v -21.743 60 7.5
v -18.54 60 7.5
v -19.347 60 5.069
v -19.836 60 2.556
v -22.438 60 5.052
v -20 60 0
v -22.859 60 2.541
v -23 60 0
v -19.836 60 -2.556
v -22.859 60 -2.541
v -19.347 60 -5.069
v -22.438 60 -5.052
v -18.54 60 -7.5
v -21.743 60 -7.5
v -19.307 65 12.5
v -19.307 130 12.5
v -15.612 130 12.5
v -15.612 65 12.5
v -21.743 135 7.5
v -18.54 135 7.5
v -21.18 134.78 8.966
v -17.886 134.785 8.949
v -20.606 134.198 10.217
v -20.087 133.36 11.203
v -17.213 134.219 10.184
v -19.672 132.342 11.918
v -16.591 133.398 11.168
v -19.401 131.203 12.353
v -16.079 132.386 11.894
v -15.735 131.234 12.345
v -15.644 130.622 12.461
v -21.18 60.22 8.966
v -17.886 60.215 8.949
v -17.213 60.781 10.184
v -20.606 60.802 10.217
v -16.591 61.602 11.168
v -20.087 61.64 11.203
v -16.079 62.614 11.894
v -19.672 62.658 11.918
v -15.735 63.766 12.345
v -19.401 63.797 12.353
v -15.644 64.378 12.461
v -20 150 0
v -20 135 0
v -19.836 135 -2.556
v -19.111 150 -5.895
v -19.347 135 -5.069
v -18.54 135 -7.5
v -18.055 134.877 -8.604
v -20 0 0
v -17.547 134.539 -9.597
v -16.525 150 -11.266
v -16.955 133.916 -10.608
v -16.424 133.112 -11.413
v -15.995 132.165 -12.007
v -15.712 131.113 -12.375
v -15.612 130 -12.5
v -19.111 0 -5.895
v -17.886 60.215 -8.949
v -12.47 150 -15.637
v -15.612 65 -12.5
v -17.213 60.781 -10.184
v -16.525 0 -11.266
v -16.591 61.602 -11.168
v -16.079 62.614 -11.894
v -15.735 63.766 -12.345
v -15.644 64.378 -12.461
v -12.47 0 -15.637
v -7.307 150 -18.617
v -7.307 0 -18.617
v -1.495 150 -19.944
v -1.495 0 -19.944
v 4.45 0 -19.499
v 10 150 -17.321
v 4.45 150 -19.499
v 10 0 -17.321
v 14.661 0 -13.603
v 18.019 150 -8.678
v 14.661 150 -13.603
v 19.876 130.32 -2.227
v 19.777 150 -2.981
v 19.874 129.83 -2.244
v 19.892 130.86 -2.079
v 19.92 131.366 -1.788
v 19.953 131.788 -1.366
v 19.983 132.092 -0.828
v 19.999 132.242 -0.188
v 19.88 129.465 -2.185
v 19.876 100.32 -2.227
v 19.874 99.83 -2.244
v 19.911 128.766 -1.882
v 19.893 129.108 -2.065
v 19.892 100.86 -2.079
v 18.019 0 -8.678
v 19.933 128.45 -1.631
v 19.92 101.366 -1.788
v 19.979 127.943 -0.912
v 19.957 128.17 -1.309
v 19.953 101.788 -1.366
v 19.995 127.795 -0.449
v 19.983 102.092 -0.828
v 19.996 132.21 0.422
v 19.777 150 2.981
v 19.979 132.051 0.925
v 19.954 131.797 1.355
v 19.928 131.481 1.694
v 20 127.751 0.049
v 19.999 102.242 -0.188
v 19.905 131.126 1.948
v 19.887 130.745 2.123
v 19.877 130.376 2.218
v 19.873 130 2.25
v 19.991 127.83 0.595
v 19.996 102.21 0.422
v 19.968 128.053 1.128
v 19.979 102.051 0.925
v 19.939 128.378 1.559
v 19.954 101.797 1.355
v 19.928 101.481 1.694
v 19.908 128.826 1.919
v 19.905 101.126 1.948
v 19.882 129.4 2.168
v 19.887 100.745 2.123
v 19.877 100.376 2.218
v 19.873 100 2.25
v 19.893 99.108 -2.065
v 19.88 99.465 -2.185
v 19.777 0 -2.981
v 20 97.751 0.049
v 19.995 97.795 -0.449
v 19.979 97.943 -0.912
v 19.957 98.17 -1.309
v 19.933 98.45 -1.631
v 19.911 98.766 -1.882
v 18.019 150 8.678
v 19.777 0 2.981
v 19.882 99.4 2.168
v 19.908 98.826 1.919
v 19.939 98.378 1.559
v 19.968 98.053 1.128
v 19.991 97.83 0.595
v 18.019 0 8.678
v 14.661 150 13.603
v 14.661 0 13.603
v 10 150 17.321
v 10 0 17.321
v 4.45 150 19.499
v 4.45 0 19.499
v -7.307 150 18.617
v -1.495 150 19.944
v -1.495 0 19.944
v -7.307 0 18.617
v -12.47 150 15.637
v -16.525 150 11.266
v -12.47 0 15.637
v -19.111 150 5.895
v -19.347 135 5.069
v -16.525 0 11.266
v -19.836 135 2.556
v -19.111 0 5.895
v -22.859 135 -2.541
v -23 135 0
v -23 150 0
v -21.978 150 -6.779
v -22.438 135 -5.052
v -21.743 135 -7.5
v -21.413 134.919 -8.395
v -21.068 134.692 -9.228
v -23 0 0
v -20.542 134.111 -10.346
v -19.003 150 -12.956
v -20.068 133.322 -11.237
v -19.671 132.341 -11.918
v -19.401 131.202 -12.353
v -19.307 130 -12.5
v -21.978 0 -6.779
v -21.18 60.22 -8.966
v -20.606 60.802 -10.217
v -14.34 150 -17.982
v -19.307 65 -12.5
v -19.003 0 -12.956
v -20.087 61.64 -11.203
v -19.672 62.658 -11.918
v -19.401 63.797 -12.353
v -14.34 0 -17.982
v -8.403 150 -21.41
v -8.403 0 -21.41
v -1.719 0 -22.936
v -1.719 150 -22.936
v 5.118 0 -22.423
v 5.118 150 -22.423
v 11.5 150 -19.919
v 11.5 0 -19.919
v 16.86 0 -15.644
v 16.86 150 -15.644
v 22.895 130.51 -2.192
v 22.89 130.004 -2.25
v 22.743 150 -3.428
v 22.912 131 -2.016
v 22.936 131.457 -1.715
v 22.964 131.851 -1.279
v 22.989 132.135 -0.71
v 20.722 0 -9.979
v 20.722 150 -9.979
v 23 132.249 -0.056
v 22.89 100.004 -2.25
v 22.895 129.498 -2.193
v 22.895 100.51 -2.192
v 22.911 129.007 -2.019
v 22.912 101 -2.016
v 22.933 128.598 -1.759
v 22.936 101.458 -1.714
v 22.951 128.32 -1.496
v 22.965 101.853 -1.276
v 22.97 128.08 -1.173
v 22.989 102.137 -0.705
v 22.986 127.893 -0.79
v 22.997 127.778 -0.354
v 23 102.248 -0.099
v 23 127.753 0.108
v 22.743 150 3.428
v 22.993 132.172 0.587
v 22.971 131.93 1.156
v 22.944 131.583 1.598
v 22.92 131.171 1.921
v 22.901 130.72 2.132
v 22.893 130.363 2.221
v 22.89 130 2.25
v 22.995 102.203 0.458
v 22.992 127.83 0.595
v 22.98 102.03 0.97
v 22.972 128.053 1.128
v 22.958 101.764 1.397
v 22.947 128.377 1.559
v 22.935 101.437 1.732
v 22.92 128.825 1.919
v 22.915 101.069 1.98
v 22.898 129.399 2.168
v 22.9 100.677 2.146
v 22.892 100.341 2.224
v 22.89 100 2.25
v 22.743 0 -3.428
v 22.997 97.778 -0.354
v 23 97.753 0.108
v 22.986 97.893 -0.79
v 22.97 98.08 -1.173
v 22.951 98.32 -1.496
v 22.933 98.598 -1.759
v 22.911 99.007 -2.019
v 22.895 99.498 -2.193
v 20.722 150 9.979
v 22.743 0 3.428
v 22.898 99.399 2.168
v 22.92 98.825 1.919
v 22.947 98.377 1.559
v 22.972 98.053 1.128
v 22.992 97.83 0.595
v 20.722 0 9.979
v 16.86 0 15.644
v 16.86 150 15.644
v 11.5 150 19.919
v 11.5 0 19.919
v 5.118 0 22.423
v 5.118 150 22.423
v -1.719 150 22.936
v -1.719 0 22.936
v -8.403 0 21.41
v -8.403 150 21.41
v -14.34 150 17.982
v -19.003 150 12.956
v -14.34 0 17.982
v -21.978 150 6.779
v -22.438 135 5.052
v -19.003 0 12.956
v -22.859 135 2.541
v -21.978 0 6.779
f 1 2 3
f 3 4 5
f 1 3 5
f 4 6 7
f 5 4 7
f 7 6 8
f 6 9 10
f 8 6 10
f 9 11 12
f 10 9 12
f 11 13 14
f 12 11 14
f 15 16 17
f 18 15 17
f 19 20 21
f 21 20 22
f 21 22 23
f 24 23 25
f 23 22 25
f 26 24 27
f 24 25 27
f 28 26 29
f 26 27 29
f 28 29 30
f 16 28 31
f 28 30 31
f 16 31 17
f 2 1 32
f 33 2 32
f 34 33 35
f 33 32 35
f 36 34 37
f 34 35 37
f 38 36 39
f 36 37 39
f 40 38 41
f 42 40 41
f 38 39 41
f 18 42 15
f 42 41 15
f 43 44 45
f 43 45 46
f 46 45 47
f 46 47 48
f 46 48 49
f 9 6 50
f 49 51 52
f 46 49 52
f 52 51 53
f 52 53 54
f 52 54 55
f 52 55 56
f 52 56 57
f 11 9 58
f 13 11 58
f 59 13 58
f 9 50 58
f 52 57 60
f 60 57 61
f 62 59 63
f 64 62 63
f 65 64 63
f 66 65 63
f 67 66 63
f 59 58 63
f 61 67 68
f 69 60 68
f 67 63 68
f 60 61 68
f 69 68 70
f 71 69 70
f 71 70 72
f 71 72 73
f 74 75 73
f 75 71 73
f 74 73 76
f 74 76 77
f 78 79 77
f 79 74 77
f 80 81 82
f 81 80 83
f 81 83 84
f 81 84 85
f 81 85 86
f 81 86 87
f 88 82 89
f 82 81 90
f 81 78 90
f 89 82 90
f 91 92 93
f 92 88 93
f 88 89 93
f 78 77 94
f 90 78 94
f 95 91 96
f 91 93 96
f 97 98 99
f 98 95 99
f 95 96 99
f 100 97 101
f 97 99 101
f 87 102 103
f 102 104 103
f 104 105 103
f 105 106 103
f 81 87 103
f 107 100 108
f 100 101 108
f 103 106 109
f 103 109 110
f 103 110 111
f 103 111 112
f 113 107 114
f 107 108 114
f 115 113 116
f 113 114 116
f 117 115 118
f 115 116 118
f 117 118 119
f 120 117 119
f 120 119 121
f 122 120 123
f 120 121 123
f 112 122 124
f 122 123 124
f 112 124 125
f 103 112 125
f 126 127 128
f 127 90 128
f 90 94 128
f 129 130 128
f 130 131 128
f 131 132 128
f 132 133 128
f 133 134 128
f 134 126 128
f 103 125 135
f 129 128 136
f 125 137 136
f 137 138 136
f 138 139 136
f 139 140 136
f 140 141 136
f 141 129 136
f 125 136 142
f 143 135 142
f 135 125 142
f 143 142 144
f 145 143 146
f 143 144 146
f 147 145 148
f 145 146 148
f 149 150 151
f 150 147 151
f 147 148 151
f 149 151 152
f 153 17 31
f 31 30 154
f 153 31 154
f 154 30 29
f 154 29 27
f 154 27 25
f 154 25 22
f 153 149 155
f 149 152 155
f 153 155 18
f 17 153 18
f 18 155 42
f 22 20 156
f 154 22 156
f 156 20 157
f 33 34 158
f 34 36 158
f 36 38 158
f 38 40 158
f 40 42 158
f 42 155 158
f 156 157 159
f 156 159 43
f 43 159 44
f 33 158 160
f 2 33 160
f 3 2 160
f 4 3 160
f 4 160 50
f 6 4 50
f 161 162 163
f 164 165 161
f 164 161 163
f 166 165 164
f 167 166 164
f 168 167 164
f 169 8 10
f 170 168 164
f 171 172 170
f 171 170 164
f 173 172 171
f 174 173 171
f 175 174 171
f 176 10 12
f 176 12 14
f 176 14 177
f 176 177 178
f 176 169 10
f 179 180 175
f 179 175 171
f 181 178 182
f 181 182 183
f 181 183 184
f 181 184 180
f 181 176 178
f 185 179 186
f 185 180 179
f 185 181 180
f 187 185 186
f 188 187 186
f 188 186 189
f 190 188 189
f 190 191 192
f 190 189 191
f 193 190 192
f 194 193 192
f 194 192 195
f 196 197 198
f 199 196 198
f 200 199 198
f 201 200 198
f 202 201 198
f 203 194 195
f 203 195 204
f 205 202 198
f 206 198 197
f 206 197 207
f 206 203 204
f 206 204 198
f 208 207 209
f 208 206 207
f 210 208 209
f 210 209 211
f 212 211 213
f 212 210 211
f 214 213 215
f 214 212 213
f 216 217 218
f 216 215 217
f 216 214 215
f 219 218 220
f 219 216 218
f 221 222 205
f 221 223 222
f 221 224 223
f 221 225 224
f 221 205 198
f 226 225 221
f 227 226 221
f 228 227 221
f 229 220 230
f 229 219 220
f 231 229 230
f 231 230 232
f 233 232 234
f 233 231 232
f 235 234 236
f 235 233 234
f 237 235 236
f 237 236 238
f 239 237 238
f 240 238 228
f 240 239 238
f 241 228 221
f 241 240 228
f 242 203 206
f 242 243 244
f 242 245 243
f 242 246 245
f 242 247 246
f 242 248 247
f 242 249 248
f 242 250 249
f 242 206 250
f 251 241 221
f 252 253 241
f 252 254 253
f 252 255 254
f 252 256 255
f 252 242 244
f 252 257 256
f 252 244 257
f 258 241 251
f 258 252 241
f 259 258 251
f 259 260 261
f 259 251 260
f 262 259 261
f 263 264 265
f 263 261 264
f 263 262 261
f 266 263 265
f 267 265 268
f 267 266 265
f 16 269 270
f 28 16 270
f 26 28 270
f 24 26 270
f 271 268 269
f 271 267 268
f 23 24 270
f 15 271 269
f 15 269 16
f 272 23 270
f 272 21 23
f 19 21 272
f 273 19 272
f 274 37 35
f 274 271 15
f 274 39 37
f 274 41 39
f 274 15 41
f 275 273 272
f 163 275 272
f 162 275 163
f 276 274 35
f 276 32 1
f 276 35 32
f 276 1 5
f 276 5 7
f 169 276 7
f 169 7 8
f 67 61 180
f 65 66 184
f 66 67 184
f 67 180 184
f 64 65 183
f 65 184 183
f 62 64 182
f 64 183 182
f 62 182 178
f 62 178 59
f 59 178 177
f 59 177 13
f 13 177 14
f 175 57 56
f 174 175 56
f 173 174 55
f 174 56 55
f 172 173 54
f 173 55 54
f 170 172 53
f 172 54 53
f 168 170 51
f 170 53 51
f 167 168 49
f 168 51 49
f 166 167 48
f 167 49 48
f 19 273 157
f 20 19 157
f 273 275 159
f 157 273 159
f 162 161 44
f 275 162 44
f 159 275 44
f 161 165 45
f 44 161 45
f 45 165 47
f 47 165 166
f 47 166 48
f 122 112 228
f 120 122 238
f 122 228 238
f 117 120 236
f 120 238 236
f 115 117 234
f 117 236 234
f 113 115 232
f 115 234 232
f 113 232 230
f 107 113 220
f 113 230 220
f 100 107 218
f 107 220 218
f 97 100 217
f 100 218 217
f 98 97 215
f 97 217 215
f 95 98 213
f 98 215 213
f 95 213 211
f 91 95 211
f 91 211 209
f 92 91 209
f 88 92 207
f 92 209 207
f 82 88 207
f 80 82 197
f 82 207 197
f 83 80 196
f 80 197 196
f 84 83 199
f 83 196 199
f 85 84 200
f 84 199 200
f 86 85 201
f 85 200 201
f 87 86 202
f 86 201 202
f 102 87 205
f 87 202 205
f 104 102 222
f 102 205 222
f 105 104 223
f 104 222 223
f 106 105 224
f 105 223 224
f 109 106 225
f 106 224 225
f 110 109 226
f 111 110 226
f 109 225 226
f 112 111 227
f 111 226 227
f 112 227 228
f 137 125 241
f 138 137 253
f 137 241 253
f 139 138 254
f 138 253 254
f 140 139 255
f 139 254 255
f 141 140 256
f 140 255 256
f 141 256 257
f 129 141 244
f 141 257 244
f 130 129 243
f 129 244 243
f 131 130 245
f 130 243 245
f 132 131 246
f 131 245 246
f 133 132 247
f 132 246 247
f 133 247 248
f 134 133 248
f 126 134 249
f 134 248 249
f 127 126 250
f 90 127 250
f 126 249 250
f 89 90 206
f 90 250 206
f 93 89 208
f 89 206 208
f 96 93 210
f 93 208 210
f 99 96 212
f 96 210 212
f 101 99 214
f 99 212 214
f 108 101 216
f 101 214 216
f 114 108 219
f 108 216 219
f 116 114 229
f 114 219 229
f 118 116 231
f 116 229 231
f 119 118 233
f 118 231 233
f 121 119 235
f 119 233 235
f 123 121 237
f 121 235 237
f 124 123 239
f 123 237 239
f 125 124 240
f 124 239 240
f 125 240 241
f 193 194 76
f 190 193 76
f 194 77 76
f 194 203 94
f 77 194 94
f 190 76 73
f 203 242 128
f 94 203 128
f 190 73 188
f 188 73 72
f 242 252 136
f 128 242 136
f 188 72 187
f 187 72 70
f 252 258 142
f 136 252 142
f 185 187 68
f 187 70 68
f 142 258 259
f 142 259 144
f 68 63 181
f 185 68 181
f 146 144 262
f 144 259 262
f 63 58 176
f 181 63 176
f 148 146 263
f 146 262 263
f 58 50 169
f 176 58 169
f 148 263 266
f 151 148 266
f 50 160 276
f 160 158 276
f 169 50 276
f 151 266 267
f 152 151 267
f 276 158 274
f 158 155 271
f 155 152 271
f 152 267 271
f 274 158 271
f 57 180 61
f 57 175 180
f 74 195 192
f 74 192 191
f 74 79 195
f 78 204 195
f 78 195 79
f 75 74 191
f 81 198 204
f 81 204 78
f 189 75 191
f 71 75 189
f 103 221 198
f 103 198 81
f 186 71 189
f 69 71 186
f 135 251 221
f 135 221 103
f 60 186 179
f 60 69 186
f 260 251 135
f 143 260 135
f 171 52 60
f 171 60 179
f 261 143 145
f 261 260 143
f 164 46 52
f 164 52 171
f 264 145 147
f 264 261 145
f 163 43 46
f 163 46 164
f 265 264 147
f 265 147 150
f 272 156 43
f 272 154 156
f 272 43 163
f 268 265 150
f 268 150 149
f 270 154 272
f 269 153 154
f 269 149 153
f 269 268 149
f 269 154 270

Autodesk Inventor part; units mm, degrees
ref_plane "YZ Plane" through (0, 0, 0) normal (1, 0, 0) x (0, 1, 0)
ref_plane "XZ Plane" through (0, 0, 0) normal (0, 1, 0) x (-1, 0, 0)
ref_plane "XY Plane" through (0, 0, 0) normal (0, 0, 1) x (1, 0, 0)
sketch "Sketch1" plane through (0, 0, 0) normal (0, 1, 0) x (-1, 0, 0)
  circle A0 centre (0, 0) radius 23
  circle A1 centre (0, 0) radius 20
  dimension "d0" = 3
  dimension "d1" = 40
extrude "Extrusion1" add sketch "Sketch1" along normal blind 150
sketch "Sketch2" plane through (0, 0, 0) normal (0, 0, 1) x (1, 0, 0)
  line L0 (-23, 135) -> (0, 135)
  line L1 (0, 135) -> (0, 60)
  line L2 (0, 60) -> (-23, 60)
  line L3 (-23, 60) -> (-23, 135)
  line L4 (23, 150) -> (-23, 150) projected
  line L5 (-23, 0) -> (23, 0) projected
  point P0 (0, 0)
  dimension "d4" = 75
  dimension "d19" = 15
extrude "Extrusion2" cut sketch "Sketch2" along normal mid plane 25
fillet "Fillet1" radius 5 4 edges at (-17.4596, 135, -12.5) (-17.4596, 135, 12.5) (-17.4596, 60, 12.5) (-17.4596, 60, -12.5)
sketch "Sketch3" plane through (0, 0, 0) normal (1, 0, 0) x (0, 1, 0)
  line L0 (-20, 0) -> (120, 0) projected
  line L1 (135, -7.5) -> (135, 7.5) projected
  line L2 (150, 20) -> (150, -20) projected
  point P0 (0, 0)
  point P1 (130, 0)
  point P2 (100, 0)
  dimension "d9" = 30
  dimension "d18" = 20
hole "Hole1" at (0, 130, 0) at (0, 100, 0) direction (1, 0, 0) diameter 4.5 end through all clearance for "Socket Head Cap Screw" size "M4" standard "Ansi Metric M Profile"
properties part number "Pancake_PVC Pipe Long" material "PVC-Piping"
